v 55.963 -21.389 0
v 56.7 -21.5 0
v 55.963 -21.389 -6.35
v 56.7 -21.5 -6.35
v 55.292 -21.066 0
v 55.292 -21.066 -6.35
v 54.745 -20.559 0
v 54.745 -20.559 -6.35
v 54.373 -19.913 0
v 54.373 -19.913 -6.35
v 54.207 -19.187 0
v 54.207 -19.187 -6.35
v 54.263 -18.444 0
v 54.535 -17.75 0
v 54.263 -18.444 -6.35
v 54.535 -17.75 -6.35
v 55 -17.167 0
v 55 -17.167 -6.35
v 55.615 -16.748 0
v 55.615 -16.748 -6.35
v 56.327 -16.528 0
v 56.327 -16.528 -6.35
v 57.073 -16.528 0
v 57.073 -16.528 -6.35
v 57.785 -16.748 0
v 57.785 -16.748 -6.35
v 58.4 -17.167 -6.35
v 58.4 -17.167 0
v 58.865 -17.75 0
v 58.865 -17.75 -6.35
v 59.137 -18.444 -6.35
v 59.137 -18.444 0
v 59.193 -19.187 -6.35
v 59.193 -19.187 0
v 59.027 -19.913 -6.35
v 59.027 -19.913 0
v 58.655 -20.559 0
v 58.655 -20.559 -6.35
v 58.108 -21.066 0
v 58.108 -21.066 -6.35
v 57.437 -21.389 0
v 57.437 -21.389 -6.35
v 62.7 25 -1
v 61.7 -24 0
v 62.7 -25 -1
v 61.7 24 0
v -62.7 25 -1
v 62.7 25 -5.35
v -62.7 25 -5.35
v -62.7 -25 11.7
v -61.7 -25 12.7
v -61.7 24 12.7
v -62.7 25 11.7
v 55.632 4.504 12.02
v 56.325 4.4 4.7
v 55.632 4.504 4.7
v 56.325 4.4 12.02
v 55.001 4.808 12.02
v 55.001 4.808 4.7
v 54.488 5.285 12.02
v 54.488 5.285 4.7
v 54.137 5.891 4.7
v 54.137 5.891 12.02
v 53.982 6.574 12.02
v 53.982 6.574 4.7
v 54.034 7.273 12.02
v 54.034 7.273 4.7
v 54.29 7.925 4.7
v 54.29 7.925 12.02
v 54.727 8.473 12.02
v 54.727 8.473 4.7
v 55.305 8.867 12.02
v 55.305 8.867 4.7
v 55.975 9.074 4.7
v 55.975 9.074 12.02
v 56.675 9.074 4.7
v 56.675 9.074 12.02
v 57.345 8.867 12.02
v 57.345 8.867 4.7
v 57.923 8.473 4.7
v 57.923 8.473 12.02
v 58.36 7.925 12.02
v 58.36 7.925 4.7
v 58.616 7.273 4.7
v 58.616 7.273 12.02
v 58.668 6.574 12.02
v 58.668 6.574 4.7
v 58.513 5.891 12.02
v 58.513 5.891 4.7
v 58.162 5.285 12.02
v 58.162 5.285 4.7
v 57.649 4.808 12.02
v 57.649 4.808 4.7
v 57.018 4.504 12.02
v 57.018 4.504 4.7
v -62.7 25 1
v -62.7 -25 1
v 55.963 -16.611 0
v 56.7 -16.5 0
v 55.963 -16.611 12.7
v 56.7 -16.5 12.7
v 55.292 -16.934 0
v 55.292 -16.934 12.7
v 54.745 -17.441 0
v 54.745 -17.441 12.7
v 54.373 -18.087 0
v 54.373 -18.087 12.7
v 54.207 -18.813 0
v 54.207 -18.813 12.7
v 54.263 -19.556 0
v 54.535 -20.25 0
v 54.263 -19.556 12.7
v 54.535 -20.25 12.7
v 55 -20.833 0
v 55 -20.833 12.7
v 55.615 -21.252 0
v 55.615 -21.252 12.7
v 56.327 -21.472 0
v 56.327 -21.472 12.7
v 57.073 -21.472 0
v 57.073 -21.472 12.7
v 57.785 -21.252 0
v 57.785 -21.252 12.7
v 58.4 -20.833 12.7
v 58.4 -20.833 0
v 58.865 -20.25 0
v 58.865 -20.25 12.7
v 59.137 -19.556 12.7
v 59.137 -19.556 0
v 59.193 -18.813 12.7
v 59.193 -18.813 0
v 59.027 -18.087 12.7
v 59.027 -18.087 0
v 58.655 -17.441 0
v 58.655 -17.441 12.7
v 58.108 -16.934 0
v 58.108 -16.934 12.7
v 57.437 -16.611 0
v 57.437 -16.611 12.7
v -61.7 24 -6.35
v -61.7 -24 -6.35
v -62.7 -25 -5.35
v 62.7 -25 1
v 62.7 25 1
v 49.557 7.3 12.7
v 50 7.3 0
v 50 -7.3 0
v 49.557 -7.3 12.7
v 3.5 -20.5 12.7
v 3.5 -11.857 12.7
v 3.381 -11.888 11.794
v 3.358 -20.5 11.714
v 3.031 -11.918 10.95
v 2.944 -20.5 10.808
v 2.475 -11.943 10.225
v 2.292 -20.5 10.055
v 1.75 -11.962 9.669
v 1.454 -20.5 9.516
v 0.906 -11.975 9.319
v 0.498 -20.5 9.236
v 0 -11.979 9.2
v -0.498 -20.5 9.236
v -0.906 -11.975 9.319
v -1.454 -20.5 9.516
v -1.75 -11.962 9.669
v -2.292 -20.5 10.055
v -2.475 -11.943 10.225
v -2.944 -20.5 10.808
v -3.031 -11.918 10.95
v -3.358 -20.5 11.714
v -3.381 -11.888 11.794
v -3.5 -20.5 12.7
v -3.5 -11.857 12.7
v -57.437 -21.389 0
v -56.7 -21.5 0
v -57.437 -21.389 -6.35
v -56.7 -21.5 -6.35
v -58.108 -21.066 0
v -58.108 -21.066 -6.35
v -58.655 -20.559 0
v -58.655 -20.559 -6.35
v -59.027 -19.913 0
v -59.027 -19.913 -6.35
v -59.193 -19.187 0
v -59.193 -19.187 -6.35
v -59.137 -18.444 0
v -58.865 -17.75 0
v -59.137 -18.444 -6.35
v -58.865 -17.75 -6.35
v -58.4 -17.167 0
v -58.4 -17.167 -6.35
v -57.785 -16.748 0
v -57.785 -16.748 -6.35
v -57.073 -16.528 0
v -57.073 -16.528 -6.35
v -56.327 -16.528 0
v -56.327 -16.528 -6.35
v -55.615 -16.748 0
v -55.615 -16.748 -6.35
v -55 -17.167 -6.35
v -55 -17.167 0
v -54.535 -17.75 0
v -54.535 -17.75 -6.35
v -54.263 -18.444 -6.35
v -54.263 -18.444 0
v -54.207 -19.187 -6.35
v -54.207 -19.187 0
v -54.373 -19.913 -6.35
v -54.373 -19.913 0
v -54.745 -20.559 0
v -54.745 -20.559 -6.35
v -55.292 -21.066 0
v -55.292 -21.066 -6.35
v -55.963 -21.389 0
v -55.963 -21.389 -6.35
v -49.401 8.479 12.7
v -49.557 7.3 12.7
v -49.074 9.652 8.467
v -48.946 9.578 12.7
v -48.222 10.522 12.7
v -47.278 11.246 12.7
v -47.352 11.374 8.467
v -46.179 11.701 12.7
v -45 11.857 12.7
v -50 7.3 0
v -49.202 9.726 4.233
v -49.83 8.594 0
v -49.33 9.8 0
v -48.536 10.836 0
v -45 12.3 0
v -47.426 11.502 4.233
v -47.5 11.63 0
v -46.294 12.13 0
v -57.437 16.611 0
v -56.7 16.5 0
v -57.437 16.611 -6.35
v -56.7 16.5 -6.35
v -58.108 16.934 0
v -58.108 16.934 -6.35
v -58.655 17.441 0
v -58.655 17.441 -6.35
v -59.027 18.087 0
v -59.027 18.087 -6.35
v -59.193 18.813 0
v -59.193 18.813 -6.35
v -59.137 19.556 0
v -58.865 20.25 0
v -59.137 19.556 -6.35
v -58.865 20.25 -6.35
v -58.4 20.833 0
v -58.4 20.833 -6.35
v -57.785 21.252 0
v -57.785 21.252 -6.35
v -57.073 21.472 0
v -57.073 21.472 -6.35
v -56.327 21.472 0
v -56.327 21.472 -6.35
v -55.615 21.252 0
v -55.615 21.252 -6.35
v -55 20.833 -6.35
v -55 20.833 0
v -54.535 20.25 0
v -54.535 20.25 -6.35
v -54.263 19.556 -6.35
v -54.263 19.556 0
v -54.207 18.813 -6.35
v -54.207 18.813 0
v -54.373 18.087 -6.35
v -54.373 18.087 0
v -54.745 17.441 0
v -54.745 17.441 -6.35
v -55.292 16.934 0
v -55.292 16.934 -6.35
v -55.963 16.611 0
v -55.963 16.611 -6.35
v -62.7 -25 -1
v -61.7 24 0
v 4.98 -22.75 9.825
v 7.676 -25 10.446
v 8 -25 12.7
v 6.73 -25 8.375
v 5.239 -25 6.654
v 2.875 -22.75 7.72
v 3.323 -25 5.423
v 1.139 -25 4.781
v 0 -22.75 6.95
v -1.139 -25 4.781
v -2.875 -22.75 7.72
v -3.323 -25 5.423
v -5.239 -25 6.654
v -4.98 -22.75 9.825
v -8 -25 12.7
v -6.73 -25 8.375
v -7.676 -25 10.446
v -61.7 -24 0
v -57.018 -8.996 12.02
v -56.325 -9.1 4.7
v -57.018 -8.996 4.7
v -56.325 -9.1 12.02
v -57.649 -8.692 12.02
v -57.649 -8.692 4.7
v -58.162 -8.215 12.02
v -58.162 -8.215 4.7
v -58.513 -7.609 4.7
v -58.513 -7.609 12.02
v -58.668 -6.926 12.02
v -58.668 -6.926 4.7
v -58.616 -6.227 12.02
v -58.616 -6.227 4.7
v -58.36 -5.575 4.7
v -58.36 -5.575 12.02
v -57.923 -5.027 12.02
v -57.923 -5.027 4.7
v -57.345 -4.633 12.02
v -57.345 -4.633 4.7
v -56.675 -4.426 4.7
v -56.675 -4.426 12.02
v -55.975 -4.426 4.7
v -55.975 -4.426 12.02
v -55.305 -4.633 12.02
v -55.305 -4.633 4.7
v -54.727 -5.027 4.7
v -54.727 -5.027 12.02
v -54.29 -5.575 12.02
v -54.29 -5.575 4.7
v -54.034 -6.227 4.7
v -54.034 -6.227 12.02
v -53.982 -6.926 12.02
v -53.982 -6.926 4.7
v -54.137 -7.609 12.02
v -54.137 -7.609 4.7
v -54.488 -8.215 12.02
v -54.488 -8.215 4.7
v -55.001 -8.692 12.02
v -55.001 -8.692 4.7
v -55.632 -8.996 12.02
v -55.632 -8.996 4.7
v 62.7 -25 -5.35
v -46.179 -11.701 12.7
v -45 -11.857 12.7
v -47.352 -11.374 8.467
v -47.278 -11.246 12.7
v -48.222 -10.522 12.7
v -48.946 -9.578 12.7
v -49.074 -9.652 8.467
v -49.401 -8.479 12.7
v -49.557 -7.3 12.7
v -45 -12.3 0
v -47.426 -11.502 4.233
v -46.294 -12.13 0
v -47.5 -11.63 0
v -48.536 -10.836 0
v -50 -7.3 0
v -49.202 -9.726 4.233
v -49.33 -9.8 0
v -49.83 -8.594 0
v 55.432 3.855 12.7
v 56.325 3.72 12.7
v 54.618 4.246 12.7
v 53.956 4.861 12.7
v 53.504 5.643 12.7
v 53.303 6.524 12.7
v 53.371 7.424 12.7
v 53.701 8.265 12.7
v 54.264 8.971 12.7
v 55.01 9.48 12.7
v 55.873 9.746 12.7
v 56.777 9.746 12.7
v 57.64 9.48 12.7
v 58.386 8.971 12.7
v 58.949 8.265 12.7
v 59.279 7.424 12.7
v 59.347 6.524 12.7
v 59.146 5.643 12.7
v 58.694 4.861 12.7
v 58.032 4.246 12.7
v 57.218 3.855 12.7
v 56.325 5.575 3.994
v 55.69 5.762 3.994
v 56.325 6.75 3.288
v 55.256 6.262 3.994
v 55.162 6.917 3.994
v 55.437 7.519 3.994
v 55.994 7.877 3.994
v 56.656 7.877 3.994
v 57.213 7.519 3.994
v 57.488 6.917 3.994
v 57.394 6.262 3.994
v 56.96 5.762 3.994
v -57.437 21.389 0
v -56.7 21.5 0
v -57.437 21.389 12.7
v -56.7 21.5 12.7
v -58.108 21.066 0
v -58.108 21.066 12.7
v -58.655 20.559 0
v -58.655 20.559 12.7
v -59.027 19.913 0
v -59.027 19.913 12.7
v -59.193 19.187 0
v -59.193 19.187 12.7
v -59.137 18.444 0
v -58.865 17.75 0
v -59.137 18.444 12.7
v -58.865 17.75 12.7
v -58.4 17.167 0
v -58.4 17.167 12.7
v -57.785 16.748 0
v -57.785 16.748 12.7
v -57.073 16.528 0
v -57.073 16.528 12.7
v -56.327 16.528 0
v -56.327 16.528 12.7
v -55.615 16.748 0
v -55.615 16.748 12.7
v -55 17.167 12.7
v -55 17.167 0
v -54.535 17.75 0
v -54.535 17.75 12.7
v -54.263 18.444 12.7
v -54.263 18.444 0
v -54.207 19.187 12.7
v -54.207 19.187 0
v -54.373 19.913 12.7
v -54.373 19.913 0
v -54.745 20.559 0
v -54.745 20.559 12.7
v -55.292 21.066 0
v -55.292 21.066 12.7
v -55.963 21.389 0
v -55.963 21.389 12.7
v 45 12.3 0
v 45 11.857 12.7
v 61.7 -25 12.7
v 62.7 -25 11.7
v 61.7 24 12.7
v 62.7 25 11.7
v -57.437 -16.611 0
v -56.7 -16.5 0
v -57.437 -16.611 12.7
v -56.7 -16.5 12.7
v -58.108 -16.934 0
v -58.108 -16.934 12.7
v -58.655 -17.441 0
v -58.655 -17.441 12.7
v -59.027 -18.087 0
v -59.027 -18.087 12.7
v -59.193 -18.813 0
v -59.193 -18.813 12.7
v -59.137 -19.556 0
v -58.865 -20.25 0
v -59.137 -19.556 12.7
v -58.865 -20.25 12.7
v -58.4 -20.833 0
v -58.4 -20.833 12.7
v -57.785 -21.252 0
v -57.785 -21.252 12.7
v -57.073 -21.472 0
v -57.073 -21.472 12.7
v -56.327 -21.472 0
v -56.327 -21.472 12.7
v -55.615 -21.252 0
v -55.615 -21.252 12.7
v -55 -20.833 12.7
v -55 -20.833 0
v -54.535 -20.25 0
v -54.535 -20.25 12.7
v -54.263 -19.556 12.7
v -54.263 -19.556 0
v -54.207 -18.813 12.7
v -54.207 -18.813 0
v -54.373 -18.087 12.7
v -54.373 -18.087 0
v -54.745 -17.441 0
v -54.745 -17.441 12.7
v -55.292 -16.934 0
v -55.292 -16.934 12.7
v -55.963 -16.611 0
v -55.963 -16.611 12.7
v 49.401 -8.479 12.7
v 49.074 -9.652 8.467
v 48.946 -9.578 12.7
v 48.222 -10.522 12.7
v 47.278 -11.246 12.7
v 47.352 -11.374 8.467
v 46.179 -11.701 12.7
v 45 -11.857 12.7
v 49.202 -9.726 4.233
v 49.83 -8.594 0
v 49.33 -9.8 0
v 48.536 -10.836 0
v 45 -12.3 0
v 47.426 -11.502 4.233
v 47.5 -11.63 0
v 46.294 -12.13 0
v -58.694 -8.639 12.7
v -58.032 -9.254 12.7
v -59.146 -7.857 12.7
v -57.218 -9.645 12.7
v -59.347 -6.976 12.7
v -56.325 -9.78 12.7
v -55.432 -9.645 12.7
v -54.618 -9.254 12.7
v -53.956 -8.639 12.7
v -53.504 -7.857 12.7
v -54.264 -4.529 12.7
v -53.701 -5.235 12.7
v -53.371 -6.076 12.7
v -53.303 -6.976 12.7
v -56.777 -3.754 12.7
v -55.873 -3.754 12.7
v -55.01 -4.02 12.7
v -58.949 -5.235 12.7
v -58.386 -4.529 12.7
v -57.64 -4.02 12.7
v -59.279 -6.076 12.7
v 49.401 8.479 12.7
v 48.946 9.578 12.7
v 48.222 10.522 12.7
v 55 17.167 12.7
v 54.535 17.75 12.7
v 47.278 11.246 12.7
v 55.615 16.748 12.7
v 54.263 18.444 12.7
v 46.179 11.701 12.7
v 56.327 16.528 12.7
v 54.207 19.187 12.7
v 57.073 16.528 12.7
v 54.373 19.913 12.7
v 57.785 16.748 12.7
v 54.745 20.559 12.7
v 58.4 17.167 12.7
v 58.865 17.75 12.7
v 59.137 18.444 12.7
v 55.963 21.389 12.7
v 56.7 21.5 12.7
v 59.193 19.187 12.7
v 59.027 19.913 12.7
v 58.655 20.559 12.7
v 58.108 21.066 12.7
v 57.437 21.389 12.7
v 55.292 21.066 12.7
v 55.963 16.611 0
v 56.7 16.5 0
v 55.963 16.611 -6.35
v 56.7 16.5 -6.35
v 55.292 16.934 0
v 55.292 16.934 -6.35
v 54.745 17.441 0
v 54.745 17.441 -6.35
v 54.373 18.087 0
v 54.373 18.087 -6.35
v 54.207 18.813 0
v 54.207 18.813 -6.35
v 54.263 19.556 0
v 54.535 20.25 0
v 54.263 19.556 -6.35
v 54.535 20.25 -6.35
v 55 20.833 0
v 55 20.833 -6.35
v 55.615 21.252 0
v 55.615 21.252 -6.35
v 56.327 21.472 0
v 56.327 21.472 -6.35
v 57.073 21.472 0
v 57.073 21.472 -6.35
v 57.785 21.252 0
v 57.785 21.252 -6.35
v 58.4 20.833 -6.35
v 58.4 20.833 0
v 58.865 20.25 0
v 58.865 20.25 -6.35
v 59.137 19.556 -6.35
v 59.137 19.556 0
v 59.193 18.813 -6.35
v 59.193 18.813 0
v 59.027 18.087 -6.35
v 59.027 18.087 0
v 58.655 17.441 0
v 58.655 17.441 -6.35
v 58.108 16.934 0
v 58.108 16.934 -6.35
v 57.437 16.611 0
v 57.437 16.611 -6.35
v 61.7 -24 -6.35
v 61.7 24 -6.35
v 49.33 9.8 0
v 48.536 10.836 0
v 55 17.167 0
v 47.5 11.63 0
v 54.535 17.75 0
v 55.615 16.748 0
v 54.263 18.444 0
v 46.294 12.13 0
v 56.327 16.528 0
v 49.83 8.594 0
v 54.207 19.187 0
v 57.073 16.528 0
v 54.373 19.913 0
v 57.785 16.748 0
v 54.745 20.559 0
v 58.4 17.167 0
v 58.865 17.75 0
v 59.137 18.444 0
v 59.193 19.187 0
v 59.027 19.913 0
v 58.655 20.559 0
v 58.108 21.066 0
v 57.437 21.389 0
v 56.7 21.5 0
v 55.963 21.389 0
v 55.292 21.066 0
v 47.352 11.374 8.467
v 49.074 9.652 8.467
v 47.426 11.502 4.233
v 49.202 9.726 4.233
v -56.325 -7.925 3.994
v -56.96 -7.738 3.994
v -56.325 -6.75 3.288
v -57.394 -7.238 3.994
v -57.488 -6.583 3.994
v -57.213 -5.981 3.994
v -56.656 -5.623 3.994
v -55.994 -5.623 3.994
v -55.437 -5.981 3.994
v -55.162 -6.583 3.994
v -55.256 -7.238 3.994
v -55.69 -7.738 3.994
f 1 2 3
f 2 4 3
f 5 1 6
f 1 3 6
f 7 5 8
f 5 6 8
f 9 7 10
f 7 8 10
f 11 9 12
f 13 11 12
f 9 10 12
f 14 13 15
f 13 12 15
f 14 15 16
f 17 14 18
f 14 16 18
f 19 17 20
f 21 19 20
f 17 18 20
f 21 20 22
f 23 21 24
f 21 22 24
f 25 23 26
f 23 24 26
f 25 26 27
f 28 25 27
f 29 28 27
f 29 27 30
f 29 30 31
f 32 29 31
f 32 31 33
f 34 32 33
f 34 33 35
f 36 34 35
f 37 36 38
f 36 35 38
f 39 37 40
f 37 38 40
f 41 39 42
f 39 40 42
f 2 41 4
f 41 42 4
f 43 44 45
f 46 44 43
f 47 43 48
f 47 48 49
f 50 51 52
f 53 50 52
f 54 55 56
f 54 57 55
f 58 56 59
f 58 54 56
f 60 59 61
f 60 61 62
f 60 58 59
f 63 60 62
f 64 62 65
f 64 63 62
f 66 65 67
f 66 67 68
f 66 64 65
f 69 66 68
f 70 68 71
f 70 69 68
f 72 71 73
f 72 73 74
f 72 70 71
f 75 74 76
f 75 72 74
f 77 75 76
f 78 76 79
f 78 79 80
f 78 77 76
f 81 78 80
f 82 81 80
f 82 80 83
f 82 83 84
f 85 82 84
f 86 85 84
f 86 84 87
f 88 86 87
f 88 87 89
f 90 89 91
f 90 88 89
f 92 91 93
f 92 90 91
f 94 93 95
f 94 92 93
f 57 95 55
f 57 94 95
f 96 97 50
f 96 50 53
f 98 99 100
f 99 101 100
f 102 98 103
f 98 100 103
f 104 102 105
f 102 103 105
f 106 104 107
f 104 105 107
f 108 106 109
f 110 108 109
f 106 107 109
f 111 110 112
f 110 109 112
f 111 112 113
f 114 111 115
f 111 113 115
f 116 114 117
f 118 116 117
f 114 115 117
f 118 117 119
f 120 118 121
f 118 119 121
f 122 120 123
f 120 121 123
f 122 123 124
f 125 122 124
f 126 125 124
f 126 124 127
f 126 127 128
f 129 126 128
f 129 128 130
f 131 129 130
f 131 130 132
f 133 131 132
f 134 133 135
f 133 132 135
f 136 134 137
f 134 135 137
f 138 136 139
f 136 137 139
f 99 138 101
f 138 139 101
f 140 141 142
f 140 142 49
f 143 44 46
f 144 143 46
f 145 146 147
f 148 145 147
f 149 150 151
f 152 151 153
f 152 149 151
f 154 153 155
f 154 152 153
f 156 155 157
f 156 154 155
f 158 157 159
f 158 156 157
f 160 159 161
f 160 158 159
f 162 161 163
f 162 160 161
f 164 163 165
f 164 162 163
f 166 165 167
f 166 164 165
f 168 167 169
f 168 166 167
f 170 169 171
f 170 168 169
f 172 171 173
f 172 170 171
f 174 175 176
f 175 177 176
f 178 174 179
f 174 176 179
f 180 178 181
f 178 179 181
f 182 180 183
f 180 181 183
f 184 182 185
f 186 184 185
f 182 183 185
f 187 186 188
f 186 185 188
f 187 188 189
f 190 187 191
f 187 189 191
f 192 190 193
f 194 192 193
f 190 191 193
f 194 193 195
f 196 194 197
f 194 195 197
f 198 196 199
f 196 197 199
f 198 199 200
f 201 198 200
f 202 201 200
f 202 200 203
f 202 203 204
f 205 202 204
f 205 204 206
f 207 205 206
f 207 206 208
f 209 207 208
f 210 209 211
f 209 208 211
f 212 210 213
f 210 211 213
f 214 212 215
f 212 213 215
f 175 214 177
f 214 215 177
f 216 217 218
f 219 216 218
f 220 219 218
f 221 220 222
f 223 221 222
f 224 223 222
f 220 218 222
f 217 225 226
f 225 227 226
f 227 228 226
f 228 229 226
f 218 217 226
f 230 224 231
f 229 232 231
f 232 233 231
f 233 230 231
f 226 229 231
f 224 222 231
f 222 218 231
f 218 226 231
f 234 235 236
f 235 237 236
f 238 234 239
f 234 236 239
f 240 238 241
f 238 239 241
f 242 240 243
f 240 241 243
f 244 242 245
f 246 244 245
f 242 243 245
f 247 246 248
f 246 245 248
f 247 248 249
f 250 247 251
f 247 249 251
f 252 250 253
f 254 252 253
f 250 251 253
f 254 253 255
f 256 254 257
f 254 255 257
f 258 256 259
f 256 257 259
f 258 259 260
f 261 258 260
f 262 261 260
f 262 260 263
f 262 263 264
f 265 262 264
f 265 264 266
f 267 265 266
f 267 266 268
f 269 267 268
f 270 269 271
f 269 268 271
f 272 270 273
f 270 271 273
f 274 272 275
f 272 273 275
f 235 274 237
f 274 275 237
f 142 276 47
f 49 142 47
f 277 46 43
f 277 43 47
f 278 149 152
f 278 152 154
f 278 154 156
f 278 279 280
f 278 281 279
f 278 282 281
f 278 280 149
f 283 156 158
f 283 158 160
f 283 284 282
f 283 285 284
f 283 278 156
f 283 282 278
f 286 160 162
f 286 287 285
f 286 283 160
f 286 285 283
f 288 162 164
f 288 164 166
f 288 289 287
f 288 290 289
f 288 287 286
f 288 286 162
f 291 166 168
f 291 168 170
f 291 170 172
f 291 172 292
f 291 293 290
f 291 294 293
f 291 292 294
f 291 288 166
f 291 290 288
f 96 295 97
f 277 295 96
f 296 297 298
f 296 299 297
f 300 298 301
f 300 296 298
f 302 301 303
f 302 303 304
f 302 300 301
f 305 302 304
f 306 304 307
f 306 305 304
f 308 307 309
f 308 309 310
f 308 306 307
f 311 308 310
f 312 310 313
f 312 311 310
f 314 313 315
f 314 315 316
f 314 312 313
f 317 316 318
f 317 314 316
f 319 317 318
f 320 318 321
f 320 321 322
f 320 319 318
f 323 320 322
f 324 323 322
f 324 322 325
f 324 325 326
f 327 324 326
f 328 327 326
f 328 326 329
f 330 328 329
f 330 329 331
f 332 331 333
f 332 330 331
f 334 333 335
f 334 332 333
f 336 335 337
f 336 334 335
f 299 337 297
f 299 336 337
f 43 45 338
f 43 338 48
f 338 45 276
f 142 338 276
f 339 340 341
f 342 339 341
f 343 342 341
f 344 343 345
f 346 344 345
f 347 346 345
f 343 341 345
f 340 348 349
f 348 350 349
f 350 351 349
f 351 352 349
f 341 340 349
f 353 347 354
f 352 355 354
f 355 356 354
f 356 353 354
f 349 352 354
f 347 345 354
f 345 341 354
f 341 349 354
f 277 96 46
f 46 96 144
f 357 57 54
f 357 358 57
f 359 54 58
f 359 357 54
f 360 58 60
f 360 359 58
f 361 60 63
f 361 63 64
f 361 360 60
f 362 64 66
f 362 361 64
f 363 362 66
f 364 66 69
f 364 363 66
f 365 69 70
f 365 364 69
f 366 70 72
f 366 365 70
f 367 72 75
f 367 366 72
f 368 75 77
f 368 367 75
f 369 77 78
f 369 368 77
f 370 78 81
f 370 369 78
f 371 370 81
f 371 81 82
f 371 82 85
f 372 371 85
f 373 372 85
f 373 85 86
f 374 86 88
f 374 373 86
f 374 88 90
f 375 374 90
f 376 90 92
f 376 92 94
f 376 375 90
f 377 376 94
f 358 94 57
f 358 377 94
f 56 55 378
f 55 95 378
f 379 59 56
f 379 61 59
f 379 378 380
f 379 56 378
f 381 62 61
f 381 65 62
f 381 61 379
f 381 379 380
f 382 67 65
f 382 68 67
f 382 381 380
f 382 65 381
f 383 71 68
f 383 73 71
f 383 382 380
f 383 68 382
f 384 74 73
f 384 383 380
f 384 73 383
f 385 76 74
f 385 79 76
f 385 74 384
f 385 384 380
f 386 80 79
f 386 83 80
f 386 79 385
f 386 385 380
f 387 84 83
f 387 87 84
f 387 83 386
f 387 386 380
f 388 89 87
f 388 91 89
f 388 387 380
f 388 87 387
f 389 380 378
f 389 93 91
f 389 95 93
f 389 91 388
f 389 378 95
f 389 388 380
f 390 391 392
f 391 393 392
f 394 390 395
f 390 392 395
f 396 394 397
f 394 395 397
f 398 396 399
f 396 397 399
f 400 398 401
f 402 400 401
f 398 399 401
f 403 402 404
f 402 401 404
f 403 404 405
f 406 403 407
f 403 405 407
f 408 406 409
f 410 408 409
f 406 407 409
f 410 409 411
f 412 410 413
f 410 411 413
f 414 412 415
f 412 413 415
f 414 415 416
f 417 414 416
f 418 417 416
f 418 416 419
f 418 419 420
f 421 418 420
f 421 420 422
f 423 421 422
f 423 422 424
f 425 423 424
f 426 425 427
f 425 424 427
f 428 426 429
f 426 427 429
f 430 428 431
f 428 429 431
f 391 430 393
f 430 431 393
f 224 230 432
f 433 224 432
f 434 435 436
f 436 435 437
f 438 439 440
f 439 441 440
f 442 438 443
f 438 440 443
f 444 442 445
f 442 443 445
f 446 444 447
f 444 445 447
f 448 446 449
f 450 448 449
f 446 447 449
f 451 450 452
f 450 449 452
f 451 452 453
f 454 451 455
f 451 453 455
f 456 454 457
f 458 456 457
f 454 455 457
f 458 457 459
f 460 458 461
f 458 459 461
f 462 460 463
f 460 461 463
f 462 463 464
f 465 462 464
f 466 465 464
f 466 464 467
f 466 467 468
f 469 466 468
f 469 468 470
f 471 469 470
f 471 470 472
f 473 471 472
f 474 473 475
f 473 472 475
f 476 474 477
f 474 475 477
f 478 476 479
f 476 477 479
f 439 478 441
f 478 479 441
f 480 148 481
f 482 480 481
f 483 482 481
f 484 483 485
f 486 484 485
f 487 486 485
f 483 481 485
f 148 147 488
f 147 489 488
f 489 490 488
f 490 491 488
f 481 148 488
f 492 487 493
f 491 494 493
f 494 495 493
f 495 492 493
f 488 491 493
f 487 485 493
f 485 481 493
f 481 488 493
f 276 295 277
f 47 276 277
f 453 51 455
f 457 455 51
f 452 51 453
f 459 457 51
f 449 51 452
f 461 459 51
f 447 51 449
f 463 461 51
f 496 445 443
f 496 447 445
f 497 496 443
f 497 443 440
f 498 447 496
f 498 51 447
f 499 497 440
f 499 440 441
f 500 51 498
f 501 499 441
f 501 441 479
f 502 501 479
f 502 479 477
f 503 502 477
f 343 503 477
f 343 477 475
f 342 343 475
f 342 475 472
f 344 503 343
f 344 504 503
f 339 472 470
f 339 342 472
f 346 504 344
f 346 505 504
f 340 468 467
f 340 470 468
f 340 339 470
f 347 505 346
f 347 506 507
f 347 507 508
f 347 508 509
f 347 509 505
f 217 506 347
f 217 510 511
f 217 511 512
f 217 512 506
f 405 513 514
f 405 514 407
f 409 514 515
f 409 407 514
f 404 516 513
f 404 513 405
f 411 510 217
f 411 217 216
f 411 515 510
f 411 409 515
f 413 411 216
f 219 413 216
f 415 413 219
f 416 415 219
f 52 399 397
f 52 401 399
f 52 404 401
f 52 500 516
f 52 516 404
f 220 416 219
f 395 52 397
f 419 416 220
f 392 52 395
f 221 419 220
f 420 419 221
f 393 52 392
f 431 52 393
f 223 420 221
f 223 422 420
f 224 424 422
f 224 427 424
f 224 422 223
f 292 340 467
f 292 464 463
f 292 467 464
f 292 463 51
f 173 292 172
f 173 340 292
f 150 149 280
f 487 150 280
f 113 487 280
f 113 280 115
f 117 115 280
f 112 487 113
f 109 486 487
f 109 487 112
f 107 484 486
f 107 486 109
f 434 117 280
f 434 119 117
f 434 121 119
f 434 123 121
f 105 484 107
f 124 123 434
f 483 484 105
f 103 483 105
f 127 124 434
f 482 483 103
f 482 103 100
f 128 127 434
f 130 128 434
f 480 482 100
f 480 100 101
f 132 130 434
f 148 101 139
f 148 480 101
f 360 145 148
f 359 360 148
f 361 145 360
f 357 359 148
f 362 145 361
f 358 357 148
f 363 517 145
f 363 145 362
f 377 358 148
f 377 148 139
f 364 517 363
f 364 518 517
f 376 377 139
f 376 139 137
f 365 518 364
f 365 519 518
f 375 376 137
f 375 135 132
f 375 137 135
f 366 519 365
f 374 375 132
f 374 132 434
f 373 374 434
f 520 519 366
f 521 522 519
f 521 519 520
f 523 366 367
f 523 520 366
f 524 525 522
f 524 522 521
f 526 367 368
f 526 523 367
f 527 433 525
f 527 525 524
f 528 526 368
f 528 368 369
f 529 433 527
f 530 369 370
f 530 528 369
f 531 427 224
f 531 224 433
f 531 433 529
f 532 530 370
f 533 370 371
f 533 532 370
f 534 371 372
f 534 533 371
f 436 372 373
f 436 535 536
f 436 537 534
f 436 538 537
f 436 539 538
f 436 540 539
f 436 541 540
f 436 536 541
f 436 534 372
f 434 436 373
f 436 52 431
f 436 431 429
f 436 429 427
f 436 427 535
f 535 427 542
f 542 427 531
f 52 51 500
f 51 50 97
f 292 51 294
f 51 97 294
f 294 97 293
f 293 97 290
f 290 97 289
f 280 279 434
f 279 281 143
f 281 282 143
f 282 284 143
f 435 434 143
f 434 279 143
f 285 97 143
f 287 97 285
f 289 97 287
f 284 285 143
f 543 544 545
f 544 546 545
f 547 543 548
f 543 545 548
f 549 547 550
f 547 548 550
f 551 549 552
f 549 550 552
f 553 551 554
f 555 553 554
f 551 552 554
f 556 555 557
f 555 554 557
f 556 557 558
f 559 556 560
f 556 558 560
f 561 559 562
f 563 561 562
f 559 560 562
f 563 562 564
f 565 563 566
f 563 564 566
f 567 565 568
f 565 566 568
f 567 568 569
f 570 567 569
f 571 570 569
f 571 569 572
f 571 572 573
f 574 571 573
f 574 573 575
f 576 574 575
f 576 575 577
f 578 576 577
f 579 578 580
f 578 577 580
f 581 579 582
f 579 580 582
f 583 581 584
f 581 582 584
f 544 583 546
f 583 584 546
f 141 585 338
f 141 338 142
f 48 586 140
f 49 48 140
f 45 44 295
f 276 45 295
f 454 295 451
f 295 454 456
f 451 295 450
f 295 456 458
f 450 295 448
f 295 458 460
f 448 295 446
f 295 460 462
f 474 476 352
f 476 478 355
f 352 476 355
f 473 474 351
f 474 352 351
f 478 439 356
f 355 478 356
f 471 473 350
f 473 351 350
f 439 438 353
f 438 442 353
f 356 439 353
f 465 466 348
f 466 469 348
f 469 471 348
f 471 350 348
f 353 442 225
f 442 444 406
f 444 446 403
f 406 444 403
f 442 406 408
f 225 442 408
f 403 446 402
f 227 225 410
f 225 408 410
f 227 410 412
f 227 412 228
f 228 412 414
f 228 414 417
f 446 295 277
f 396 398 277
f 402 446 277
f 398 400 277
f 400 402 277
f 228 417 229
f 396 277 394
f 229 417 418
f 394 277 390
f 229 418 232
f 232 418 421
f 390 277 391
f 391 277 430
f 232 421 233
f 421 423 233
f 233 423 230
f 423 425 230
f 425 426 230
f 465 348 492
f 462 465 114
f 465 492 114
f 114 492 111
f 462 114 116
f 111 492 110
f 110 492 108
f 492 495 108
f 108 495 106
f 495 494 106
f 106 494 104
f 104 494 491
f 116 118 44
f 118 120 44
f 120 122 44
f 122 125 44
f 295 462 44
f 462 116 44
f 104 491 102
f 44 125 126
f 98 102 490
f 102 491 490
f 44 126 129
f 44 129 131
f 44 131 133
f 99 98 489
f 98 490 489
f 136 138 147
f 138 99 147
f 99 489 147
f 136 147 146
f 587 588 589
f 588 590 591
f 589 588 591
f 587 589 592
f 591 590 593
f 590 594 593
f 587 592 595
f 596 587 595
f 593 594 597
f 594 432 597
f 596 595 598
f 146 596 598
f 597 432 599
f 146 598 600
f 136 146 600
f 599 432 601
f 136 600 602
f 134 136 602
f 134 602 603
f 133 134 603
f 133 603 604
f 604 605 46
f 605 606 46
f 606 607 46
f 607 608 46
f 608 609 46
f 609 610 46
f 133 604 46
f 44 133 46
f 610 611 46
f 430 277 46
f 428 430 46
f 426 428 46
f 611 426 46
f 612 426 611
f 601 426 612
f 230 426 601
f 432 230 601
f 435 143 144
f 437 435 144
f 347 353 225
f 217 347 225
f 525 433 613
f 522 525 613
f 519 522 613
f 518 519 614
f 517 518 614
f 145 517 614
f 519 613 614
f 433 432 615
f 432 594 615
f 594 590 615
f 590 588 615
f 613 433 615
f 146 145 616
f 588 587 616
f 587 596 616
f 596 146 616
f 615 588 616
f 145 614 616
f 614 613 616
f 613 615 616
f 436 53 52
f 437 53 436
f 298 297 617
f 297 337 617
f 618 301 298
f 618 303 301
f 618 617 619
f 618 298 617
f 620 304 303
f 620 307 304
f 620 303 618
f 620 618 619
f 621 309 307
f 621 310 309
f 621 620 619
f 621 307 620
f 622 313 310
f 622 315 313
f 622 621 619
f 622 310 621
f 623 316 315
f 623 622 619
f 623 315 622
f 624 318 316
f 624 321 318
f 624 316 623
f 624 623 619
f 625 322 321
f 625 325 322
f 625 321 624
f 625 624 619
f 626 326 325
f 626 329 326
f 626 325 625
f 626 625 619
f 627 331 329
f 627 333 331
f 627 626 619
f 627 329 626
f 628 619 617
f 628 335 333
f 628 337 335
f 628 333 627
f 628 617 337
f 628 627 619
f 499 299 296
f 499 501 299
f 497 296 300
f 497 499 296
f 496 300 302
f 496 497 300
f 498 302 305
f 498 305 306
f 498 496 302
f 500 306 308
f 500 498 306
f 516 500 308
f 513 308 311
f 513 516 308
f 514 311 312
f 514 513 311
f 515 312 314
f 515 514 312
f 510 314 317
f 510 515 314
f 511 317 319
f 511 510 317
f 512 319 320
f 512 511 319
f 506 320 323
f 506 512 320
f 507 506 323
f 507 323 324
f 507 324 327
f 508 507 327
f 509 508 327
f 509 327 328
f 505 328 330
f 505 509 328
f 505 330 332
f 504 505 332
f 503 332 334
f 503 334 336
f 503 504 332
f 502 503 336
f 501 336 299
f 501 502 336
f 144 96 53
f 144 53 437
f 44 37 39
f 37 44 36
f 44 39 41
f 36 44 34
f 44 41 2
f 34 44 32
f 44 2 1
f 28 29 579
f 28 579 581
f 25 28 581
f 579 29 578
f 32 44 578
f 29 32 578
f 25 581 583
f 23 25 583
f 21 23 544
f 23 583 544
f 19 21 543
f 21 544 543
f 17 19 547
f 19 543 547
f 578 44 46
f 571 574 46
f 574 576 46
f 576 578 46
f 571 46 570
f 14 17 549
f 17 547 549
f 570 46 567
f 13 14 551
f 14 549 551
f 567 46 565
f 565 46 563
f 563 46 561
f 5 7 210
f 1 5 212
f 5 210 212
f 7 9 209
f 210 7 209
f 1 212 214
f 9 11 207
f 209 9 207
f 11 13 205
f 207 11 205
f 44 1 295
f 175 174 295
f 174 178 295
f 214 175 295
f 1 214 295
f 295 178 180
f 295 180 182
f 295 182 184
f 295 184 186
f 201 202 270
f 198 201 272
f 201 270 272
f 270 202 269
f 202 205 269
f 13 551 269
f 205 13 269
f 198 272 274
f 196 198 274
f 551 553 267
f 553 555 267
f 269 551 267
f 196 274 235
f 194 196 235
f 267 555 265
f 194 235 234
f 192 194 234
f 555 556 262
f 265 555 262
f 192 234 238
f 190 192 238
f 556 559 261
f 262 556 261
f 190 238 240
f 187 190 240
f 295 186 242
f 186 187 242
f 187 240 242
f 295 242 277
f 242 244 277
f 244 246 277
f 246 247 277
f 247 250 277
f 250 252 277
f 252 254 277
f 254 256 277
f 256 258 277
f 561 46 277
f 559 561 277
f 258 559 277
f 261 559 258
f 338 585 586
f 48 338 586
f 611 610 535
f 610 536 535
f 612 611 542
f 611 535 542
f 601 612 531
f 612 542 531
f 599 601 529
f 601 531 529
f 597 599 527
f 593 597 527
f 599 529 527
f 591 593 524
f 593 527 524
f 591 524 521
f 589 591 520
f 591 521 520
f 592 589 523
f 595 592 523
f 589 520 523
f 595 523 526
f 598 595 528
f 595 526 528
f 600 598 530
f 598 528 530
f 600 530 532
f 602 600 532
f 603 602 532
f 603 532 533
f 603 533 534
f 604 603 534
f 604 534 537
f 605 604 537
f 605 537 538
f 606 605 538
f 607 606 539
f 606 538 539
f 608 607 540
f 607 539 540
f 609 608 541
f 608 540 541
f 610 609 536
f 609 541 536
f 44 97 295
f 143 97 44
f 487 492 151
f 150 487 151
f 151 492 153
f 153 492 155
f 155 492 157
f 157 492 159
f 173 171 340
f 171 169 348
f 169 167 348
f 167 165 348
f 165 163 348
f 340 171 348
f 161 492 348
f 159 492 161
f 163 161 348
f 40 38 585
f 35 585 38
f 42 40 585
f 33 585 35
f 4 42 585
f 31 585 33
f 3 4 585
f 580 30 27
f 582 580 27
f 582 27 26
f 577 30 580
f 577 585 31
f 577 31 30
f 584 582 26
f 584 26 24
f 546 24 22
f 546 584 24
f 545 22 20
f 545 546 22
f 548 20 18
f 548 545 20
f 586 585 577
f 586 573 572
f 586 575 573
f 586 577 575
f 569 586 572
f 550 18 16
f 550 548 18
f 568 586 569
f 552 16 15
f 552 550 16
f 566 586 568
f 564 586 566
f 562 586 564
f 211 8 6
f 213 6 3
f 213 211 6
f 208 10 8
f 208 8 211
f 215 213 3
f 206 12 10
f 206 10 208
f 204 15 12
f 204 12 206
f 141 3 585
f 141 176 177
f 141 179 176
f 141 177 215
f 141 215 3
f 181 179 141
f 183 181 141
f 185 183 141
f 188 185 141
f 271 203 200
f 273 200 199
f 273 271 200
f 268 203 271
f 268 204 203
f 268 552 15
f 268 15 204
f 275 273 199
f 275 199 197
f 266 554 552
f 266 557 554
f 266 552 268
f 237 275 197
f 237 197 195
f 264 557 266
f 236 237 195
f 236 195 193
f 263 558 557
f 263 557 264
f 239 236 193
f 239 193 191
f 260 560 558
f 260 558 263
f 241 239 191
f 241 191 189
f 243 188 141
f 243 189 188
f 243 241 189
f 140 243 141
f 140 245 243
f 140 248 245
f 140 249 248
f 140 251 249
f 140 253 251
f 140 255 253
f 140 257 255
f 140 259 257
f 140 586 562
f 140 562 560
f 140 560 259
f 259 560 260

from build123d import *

# Parameters (mm, degrees)
MOLDSKETCH_W                         = 125.4
MOLDSKETCH_H                         = 50
MOLDEXTRUSION12_7MM_DEPTH            = 12.7
COVERSKETCH_W                        = 125.4
COVERSKETCH_H                        = 50
COVERTHICKNESS_DEPTH                 = 6.35
MOLD2DEGDRAFT_ANGLE                  = 2
F_6_0MM_DOWEL_HOLES_AT_2_COUNT       = 2
F_6_0MM_DOWEL_HOLES_AT_2_PITCH       = 113.456037741
CHAMFER1_SIZE                        = 1
SKETCH9_W                            = 2.5
SKETCH9_H                            = 12.7
TAP_DRILL_FOR_M6X1_0_TAP1_AT_2_COUNT = 2
TAP_DRILL_FOR_M6X1_0_TAP1_AT_2_PITCH = 113.4
TAP_DRILL_FOR_M6X1_0_TAP1_AT_3_COUNT = 2
TAP_DRILL_FOR_M6X1_0_TAP1_AT_3_PITCH = 119.597491612
TAP_DRILL_FOR_M6X1_0_TAP1_AT_4_COUNT = 2
TAP_DRILL_FOR_M6X1_0_TAP1_AT_4_PITCH = 38
COVERCHAMFER_SIZE                    = 1
SKETCH11_W                           = 2.5
SKETCH11_H                           = 6.35
TAP_DRILL_FOR_M6X1_0_TAP2_AT_2_COUNT = 2
TAP_DRILL_FOR_M6X1_0_TAP2_AT_2_PITCH = 113.4
TAP_DRILL_FOR_M6X1_0_TAP2_AT_3_COUNT = 2
TAP_DRILL_FOR_M6X1_0_TAP2_AT_3_PITCH = 119.597491612
TAP_DRILL_FOR_M6X1_0_TAP2_AT_4_COUNT = 2
TAP_DRILL_FOR_M6X1_0_TAP2_AT_4_PITCH = 38


with BuildPart() as part:
    # MoldSketch → MoldExtrusion12.7mm (new body)
    with BuildSketch(Plane.XY):
        Rectangle(MOLDSKETCH_W, MOLDSKETCH_H)
        with BuildLine():
            Line((-45, 12.3), (45, 12.3))
            ThreePointArc((45, 12.3), (48.535533906, 10.835533906), (50, 7.3))
            Line((50, 7.3), (50, -7.3))
            ThreePointArc((50, -7.3), (48.535533906, -10.835533906), (45, -12.3))
            Line((45, -12.3), (-45, -12.3))
            ThreePointArc((-45, -12.3), (-48.535533906, -10.835533906), (-50, -7.3))
            Line((-50, -7.3), (-50, 7.3))
            ThreePointArc((-50, 7.3), (-48.535533906, 10.835533906), (-45, 12.3))
        make_face(mode=Mode.SUBTRACT)
    extrude(amount=MOLDEXTRUSION12_7MM_DEPTH)

    # Mold2DegDraft
    mold2degdraft_faces = [part.faces().sort_by_distance(p)[0] for p in [
        (48.535533906, -10.835533906, 6.35),
        (50, 0, 6.35),
        (48.535533906, 10.835533906, 6.35),
        (0, 12.3, 6.35),
        (-48.535533906, 10.835533906, 6.35),
        (-50, 0, 6.35),
        (-48.535533906, -10.835533906, 6.35),
        (0, -12.3, 6.35),
    ]]
    draft(mold2degdraft_faces, Plane(origin=(0, 0, 0), x_dir=(-1, 0, 0), z_dir=(0, 0, -1)), MOLD2DEGDRAFT_ANGLE)

    # Sketch7 → Ø6.0mm Dowel Holes (revolve, cut)
    with BuildSketch(Plane(origin=(-56.325, -6.75, 12.7), x_dir=(0, -1, 0), z_dir=(1, 0, 0))):
        Polygon((0, 0), (0, 9.412022455), (2.35, 8), (2.35, 0.68), (3.03, 0), align=None)
    f_6_0mm_dowel_holes = revolve(axis=Axis((-56.325, -6.75, 19.05), (0, 0, -1)), mode=Mode.SUBTRACT)

    # Ø6.0mm Dowel Holes at 2: Ø6.0mm Dowel Holes ×2
    with Locations(*[Vector(0.9928955941213675, 0.11898881953518381, 0) * (i * F_6_0MM_DOWEL_HOLES_AT_2_PITCH) for i in range(1, F_6_0MM_DOWEL_HOLES_AT_2_COUNT)]):
        add(f_6_0mm_dowel_holes, mode=Mode.SUBTRACT)

    # InjectionHole → CSK for M6 Flat Head Machine Screw1 (revolve, cut)
    with BuildSketch(Plane(origin=(0, -25, 12.7), x_dir=(0, 0, -1), z_dir=(1, 0, 0))):
        Polygon((0, 0), (0, 13.143493773), (3.5, 13.143493773), (3.5, 4.5), (8, 0), align=None)
    revolve(axis=Axis((0, -31.35, 12.7), (0, 1, 0)), mode=Mode.SUBTRACT)

    # Chamfer1
    chamfer1_edges = [part.edges().sort_by_distance(p)[0] for p in [
        (-62.7, 0, 12.7),
        (62.7, 0, 12.7),
        (0, -25, 0),
        (-62.7, 0, 0),
        (0, 25, 0),
        (62.7, 0, 0),
        (0, 25, 12.7),
    ]]
    chamfer(chamfer1_edges, length=CHAMFER1_SIZE)

    # Sketch9 → Tap Drill for M6x1.0 Tap1 (revolve, cut)
    with BuildSketch(Plane(origin=(56.7, 19, 0), x_dir=(0, 1, 0), z_dir=(1, 0, 0))):
        with Locations((1.25, 6.35)):
            Rectangle(SKETCH9_W, SKETCH9_H)
    tap_drill_for_m6x1_0_tap1 = revolve(axis=Axis((56.7, 19, -6.35), (0, 0, 1)), mode=Mode.SUBTRACT)

    # Tap Drill for M6x1.0 Tap1 at 2: Tap Drill for M6x1.0 Tap1 ×2
    with Locations(*[(-i * TAP_DRILL_FOR_M6X1_0_TAP1_AT_2_PITCH, 0, 0) for i in range(1, TAP_DRILL_FOR_M6X1_0_TAP1_AT_2_COUNT)]):
        add(tap_drill_for_m6x1_0_tap1, mode=Mode.SUBTRACT)

    # Tap Drill for M6x1.0 Tap1 at 3: Tap Drill for M6x1.0 Tap1 ×2
    with Locations(*[Vector(-0.9481804214374986, -0.3177324163547175, 0) * (i * TAP_DRILL_FOR_M6X1_0_TAP1_AT_3_PITCH) for i in range(1, TAP_DRILL_FOR_M6X1_0_TAP1_AT_3_COUNT)]):
        add(tap_drill_for_m6x1_0_tap1, mode=Mode.SUBTRACT)

    # Tap Drill for M6x1.0 Tap1 at 4: Tap Drill for M6x1.0 Tap1 ×2
    with Locations(*[(0, -i * TAP_DRILL_FOR_M6X1_0_TAP1_AT_4_PITCH, 0) for i in range(1, TAP_DRILL_FOR_M6X1_0_TAP1_AT_4_COUNT)]):
        add(tap_drill_for_m6x1_0_tap1, mode=Mode.SUBTRACT)


with BuildPart() as body_2:
    # CoverSketch → CoverThickness (new body)
    with BuildSketch(Plane(origin=(0, 0, 0), x_dir=(-1, 0, 0), z_dir=(0, 0, -1))):
        Rectangle(COVERSKETCH_W, COVERSKETCH_H)
    extrude(amount=COVERTHICKNESS_DEPTH)

    # CoverChamfer
    coverchamfer_edges = [body_2.edges().sort_by_distance(p)[0] for p in [
        (-62.7, 0, -6.35),
        (0, 25, -6.35),
        (62.7, 0, -6.35),
        (0, 25, 0),
        (-62.7, 0, 0),
        (0, -25, 0),
        (62.7, 0, 0),
        (0, -25, -6.35),
    ]]
    chamfer(coverchamfer_edges, length=COVERCHAMFER_SIZE)

    # Sketch11 → Tap Drill for M6x1.0 Tap2 (revolve, cut)
    with BuildSketch(Plane(origin=(-56.7, 19, 0), x_dir=(0, -1, 0), z_dir=(1, 0, 0))):
        with Locations((1.25, 3.175)):
            Rectangle(SKETCH11_W, SKETCH11_H)
    tap_drill_for_m6x1_0_tap2 = revolve(axis=Axis((-56.7, 19, 6.35), (0, 0, -1)), mode=Mode.SUBTRACT)

    # Tap Drill for M6x1.0 Tap2 at 2: Tap Drill for M6x1.0 Tap2 ×2
    with Locations(*[(i * TAP_DRILL_FOR_M6X1_0_TAP2_AT_2_PITCH, 0, 0) for i in range(1, TAP_DRILL_FOR_M6X1_0_TAP2_AT_2_COUNT)]):
        add(tap_drill_for_m6x1_0_tap2, mode=Mode.SUBTRACT)

    # Tap Drill for M6x1.0 Tap2 at 3: Tap Drill for M6x1.0 Tap2 ×2
    with Locations(*[Vector(0.9481804214374986, -0.3177324163547175, 0) * (i * TAP_DRILL_FOR_M6X1_0_TAP2_AT_3_PITCH) for i in range(1, TAP_DRILL_FOR_M6X1_0_TAP2_AT_3_COUNT)]):
        add(tap_drill_for_m6x1_0_tap2, mode=Mode.SUBTRACT)

    # Tap Drill for M6x1.0 Tap2 at 4: Tap Drill for M6x1.0 Tap2 ×2
    with Locations(*[(0, -i * TAP_DRILL_FOR_M6X1_0_TAP2_AT_4_PITCH, 0) for i in range(1, TAP_DRILL_FOR_M6X1_0_TAP2_AT_4_COUNT)]):
        add(tap_drill_for_m6x1_0_tap2, mode=Mode.SUBTRACT)


solid = Compound([part.part, body_2.part])
